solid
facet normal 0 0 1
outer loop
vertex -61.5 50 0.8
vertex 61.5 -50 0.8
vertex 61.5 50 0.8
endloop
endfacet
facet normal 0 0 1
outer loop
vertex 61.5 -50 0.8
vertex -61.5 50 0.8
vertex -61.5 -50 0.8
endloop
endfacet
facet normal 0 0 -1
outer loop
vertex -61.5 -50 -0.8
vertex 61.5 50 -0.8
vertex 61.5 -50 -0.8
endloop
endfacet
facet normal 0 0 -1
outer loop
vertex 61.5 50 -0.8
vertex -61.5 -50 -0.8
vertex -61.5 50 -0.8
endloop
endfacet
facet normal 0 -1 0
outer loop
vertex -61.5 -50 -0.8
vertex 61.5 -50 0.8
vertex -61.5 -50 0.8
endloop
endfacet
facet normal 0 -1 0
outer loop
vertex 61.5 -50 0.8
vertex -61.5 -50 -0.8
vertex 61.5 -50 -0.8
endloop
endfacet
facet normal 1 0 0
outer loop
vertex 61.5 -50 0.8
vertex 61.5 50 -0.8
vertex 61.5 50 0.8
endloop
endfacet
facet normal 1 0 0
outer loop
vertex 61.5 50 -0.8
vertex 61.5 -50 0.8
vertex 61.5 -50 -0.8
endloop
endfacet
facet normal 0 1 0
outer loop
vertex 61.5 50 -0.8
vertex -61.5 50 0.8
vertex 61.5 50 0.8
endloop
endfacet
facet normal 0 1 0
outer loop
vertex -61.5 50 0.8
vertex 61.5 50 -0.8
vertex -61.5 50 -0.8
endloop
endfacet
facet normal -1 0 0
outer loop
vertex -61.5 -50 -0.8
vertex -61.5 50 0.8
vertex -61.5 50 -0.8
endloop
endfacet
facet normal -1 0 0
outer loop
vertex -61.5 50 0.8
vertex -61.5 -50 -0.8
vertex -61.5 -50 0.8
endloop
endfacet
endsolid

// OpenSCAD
$fn=64;

board_x = 123.0;
board_y = 100.0;
board_th = 1.6;

module control_board(x=board_x, y=board_y, th=board_th){
    translate([-x/2, -y/2, -th/2])
        cube([x, y, th], center=false);
}

control_board();
